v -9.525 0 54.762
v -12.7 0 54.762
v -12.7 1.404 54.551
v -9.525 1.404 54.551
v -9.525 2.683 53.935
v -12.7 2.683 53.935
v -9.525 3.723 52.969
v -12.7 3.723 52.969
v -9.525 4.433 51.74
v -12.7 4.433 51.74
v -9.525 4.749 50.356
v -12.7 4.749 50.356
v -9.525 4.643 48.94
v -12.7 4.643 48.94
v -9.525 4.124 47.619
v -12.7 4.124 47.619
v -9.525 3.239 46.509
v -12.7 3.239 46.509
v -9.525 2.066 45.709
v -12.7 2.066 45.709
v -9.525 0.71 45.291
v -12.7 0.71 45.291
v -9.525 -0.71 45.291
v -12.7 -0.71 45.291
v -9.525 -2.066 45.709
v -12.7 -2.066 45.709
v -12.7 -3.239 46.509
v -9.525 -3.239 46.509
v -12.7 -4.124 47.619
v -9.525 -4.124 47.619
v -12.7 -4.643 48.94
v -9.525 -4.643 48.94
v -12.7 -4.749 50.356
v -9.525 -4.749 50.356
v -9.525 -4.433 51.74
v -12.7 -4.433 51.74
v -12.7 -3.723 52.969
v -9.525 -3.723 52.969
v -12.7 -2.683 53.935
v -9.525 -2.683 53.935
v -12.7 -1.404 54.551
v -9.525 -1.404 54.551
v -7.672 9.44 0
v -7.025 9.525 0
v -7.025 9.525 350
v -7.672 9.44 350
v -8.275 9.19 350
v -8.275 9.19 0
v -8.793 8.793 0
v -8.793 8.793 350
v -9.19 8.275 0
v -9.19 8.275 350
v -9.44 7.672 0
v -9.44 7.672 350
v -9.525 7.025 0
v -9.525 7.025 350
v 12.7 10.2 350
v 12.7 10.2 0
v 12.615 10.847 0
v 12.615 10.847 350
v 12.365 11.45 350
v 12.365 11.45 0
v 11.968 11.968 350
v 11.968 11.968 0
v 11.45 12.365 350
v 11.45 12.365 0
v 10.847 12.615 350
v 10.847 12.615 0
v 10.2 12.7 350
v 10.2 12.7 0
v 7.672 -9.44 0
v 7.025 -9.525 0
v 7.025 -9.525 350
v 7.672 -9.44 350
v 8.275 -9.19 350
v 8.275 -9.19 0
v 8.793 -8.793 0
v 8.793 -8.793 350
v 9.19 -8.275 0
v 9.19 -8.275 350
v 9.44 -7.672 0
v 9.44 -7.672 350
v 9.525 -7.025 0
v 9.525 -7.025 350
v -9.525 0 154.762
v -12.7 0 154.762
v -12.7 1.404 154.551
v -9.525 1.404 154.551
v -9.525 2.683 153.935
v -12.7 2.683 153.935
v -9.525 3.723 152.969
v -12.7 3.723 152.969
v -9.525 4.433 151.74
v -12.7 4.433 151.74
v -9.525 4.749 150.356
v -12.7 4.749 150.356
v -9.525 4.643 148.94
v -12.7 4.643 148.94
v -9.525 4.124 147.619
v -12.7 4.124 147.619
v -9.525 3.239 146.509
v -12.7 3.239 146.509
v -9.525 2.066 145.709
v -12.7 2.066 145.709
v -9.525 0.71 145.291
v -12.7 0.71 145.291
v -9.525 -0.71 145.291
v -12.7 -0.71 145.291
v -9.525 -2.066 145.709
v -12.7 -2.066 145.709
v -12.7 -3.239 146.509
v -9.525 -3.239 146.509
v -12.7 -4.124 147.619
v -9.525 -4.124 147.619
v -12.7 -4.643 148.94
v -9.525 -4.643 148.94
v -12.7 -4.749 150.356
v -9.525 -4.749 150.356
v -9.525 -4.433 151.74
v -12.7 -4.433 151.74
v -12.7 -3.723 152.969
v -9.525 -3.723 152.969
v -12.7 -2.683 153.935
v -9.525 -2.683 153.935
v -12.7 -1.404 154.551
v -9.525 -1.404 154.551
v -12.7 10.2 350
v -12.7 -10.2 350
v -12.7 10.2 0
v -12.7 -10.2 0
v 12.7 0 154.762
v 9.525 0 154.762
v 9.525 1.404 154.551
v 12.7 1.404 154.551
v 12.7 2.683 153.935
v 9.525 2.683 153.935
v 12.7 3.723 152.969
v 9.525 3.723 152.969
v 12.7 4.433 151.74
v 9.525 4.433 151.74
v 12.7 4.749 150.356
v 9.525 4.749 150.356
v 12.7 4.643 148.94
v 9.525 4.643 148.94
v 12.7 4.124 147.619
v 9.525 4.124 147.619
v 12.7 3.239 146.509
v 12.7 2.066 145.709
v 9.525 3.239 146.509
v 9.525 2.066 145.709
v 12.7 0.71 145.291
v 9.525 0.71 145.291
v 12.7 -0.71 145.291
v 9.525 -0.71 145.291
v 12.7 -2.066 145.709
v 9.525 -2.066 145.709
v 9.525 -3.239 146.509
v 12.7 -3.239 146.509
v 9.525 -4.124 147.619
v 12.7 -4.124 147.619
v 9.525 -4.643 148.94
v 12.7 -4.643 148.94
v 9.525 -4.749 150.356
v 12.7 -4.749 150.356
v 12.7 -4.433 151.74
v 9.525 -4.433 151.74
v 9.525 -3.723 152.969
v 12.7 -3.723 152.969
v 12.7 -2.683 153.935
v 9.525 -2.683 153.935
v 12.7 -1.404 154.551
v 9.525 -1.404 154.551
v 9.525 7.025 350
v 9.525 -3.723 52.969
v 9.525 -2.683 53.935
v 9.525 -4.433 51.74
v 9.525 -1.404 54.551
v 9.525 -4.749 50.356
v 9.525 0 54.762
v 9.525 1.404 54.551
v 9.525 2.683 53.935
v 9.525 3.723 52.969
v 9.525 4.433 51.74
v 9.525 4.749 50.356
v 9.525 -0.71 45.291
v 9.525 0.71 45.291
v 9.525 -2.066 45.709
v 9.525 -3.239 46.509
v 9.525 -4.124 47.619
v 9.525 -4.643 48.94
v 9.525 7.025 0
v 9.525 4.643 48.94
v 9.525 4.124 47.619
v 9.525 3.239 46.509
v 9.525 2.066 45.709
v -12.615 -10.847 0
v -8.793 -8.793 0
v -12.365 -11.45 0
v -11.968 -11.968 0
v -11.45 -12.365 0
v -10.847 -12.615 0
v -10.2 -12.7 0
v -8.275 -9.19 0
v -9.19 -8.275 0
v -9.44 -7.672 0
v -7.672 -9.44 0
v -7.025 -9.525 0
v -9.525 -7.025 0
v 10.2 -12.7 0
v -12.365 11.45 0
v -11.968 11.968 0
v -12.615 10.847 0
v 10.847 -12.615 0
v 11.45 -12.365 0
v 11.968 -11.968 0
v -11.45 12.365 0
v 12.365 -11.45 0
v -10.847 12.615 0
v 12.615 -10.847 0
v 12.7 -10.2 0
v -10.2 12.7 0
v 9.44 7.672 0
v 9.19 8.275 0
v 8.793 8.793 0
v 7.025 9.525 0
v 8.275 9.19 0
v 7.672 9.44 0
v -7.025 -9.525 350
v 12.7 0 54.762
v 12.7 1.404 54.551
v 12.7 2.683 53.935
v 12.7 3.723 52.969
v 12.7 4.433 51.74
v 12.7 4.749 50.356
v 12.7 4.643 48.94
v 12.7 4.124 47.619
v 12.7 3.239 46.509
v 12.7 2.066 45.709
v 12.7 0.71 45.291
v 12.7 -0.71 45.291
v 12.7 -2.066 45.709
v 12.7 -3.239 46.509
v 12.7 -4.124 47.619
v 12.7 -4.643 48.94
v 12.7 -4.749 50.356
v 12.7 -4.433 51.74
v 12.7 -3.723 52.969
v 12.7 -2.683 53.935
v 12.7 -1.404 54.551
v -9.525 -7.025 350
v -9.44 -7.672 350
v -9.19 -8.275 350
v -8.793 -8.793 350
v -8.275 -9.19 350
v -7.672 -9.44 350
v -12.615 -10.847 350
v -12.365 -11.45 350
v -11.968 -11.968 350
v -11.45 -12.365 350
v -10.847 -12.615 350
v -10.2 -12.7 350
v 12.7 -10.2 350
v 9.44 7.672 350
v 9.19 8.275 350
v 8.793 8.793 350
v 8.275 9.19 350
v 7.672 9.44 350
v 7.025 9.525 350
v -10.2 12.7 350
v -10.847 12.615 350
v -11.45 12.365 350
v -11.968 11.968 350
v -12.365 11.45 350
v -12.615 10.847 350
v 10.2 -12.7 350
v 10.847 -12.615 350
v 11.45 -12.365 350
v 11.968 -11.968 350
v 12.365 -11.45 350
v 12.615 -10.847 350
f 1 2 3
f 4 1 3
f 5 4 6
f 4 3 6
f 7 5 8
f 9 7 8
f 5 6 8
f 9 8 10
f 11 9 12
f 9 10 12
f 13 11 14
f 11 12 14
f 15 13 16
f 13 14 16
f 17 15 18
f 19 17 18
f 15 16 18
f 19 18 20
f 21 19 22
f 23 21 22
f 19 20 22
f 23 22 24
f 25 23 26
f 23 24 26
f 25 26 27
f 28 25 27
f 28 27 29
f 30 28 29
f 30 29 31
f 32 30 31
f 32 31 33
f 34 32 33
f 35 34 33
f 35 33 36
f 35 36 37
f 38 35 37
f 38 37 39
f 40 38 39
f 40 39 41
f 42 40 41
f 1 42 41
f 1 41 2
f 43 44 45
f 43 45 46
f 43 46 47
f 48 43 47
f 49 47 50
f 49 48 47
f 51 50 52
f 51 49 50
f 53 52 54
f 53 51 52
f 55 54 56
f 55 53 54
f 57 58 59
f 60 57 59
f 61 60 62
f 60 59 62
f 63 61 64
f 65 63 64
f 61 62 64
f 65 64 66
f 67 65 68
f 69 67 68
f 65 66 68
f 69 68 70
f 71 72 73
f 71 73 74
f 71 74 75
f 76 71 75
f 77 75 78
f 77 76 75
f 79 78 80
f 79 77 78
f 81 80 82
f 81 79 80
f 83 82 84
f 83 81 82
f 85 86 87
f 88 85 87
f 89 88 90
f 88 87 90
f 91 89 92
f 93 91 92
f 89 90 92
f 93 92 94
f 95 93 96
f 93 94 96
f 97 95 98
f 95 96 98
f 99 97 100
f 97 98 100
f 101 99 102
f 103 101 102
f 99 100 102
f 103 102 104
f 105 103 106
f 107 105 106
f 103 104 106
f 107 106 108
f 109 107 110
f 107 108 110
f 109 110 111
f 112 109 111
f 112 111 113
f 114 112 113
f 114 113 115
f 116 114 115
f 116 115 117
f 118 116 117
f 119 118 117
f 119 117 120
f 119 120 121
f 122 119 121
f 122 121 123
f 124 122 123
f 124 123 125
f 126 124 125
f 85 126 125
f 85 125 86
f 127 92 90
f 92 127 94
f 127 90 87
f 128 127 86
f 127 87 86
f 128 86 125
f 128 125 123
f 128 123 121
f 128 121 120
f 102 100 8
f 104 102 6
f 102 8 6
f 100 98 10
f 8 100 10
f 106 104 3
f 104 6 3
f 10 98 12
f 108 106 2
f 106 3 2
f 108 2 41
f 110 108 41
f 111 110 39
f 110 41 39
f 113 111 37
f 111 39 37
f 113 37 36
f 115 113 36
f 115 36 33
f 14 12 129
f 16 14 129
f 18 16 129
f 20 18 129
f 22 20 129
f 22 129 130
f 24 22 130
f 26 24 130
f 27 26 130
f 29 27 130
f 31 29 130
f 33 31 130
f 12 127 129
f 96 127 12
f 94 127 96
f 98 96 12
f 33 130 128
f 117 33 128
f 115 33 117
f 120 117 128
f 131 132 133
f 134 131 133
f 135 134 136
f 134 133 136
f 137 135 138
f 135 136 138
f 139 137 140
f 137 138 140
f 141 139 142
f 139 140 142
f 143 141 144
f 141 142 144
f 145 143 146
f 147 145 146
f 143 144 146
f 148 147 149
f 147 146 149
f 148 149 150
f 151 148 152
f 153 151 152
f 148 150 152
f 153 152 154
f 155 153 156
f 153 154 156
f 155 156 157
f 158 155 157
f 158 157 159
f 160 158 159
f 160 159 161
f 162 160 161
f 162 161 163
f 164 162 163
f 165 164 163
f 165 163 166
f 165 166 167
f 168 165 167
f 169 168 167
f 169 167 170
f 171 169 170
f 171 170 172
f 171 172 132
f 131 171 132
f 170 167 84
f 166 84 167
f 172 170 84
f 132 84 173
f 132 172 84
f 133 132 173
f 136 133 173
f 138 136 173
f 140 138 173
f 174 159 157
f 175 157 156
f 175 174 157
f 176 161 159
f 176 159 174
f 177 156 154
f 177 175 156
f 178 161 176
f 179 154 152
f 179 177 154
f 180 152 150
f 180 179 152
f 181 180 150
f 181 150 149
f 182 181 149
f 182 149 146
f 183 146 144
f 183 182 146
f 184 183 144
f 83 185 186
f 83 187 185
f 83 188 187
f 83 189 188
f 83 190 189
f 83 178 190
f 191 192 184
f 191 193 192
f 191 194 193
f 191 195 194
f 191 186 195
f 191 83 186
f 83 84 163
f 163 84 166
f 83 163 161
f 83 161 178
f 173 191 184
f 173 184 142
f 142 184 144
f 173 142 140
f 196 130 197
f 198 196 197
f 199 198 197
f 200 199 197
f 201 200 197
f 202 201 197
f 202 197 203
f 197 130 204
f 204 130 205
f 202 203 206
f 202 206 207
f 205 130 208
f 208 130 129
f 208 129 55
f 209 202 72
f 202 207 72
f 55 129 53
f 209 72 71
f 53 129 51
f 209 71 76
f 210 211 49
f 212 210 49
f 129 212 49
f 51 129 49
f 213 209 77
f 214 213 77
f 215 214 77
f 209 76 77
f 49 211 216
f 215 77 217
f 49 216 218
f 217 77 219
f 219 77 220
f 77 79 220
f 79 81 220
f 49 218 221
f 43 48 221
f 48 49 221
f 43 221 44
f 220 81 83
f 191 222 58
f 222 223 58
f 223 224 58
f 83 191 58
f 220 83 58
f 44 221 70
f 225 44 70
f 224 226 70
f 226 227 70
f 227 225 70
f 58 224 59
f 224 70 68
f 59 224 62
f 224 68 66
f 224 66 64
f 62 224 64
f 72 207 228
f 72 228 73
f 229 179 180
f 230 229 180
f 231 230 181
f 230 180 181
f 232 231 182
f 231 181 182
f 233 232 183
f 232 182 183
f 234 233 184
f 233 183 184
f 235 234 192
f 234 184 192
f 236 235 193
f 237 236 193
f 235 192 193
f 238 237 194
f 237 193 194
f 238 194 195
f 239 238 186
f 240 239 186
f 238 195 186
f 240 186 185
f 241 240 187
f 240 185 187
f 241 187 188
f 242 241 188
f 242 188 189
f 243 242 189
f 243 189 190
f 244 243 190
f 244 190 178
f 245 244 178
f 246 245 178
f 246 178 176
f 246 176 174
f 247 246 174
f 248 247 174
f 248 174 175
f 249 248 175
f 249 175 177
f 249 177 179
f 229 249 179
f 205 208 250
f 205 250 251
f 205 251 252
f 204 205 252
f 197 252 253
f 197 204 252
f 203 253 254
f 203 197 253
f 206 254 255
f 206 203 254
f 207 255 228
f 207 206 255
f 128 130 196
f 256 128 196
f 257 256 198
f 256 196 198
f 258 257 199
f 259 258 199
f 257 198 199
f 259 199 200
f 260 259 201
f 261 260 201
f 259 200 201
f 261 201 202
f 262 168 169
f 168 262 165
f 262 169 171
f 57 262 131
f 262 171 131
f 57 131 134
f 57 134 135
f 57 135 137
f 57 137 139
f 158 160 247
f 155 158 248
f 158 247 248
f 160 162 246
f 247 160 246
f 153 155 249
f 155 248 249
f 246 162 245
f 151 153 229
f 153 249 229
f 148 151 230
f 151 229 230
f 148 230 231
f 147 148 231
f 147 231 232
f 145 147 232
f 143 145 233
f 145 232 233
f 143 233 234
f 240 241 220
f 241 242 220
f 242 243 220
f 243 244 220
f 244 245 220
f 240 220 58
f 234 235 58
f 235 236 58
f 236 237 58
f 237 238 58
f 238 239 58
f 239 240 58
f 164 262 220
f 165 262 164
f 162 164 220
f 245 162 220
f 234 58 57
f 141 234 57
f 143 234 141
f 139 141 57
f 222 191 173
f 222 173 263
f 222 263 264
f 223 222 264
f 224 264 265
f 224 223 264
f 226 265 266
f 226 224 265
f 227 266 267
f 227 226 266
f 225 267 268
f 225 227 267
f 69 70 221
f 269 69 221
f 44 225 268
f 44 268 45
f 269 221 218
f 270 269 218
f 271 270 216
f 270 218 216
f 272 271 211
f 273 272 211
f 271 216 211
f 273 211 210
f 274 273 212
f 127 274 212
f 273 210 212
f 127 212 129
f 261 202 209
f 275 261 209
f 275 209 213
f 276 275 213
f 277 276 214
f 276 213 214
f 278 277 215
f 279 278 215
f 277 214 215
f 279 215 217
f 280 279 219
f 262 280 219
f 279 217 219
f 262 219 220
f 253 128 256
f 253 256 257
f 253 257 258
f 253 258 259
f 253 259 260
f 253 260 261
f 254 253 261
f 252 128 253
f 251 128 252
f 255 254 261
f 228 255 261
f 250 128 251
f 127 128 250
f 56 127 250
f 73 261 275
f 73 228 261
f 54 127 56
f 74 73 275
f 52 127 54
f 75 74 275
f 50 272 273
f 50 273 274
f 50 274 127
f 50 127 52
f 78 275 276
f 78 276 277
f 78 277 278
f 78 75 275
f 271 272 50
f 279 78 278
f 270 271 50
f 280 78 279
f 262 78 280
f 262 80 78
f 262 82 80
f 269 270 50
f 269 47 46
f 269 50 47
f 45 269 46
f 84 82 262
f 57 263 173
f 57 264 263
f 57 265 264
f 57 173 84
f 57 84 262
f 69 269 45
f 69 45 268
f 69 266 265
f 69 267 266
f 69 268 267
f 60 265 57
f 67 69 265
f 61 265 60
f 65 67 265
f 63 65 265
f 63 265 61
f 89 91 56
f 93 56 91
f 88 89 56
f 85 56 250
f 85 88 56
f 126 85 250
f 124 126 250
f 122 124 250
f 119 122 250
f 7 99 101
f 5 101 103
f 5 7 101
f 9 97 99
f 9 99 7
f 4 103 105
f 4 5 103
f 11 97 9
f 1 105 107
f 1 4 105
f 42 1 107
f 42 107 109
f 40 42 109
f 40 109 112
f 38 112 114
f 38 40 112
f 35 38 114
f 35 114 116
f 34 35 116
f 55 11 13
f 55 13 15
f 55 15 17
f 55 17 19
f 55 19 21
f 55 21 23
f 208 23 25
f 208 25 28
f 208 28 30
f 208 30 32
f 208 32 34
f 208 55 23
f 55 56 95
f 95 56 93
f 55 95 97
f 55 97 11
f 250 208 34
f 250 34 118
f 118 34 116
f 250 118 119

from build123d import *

# Parameters (mm, degrees)
SALIENTE_EXTRUIR1_DEPTH = 350
CROQUIS2_R              = 4.7625
CORTAR_EXTRUIR1_DEPTH   = 26.4


with BuildPart() as part:
    # Croquis1 → Saliente-Extruir1 (new body)
    with BuildSketch(Plane.XY):
        with BuildLine():
            Line((-10.2, -12.7), (10.2, -12.7))
            ThreePointArc((10.2, -12.7), (11.967766953, -11.967766953), (12.7, -10.2))
            Line((12.7, -10.2), (12.7, 10.2))
            ThreePointArc((12.7, 10.2), (11.967766953, 11.967766953), (10.2, 12.7))
            Line((10.2, 12.7), (-10.2, 12.7))
            ThreePointArc((-10.2, 12.7), (-11.967766953, 11.967766953), (-12.7, 10.2))
            Line((-12.7, 10.2), (-12.7, -10.2))
            ThreePointArc((-12.7, -10.2), (-11.967766953, -11.967766953), (-10.2, -12.7))
        make_face()
        with BuildLine():
            Line((-7.025, -9.525), (7.025, -9.525))
            ThreePointArc((7.025, -9.525), (8.792766953, -8.792766953), (9.525, -7.025))
            Line((9.525, -7.025), (9.525, 7.025))
            ThreePointArc((9.525, 7.025), (8.792766953, 8.792766953), (7.025, 9.525))
            Line((7.025, 9.525), (-7.025, 9.525))
            ThreePointArc((-7.025, 9.525), (-8.792766953, 8.792766953), (-9.525, 7.025))
            Line((-9.525, 7.025), (-9.525, -7.025))
            ThreePointArc((-9.525, -7.025), (-8.792766953, -8.792766953), (-7.025, -9.525))
        make_face(mode=Mode.SUBTRACT)
    extrude(amount=SALIENTE_EXTRUIR1_DEPTH)

    # Croquis2 → Cortar-Extruir1 (cut, through all)
    with BuildSketch(Plane.ZY.offset(12.7)):
        with Locations((50, 0)):
            Circle(CROQUIS2_R)
        with Locations((150, 0)):
            Circle(CROQUIS2_R)
    extrude(amount=-CORTAR_EXTRUIR1_DEPTH, mode=Mode.SUBTRACT)


solid = part.part
